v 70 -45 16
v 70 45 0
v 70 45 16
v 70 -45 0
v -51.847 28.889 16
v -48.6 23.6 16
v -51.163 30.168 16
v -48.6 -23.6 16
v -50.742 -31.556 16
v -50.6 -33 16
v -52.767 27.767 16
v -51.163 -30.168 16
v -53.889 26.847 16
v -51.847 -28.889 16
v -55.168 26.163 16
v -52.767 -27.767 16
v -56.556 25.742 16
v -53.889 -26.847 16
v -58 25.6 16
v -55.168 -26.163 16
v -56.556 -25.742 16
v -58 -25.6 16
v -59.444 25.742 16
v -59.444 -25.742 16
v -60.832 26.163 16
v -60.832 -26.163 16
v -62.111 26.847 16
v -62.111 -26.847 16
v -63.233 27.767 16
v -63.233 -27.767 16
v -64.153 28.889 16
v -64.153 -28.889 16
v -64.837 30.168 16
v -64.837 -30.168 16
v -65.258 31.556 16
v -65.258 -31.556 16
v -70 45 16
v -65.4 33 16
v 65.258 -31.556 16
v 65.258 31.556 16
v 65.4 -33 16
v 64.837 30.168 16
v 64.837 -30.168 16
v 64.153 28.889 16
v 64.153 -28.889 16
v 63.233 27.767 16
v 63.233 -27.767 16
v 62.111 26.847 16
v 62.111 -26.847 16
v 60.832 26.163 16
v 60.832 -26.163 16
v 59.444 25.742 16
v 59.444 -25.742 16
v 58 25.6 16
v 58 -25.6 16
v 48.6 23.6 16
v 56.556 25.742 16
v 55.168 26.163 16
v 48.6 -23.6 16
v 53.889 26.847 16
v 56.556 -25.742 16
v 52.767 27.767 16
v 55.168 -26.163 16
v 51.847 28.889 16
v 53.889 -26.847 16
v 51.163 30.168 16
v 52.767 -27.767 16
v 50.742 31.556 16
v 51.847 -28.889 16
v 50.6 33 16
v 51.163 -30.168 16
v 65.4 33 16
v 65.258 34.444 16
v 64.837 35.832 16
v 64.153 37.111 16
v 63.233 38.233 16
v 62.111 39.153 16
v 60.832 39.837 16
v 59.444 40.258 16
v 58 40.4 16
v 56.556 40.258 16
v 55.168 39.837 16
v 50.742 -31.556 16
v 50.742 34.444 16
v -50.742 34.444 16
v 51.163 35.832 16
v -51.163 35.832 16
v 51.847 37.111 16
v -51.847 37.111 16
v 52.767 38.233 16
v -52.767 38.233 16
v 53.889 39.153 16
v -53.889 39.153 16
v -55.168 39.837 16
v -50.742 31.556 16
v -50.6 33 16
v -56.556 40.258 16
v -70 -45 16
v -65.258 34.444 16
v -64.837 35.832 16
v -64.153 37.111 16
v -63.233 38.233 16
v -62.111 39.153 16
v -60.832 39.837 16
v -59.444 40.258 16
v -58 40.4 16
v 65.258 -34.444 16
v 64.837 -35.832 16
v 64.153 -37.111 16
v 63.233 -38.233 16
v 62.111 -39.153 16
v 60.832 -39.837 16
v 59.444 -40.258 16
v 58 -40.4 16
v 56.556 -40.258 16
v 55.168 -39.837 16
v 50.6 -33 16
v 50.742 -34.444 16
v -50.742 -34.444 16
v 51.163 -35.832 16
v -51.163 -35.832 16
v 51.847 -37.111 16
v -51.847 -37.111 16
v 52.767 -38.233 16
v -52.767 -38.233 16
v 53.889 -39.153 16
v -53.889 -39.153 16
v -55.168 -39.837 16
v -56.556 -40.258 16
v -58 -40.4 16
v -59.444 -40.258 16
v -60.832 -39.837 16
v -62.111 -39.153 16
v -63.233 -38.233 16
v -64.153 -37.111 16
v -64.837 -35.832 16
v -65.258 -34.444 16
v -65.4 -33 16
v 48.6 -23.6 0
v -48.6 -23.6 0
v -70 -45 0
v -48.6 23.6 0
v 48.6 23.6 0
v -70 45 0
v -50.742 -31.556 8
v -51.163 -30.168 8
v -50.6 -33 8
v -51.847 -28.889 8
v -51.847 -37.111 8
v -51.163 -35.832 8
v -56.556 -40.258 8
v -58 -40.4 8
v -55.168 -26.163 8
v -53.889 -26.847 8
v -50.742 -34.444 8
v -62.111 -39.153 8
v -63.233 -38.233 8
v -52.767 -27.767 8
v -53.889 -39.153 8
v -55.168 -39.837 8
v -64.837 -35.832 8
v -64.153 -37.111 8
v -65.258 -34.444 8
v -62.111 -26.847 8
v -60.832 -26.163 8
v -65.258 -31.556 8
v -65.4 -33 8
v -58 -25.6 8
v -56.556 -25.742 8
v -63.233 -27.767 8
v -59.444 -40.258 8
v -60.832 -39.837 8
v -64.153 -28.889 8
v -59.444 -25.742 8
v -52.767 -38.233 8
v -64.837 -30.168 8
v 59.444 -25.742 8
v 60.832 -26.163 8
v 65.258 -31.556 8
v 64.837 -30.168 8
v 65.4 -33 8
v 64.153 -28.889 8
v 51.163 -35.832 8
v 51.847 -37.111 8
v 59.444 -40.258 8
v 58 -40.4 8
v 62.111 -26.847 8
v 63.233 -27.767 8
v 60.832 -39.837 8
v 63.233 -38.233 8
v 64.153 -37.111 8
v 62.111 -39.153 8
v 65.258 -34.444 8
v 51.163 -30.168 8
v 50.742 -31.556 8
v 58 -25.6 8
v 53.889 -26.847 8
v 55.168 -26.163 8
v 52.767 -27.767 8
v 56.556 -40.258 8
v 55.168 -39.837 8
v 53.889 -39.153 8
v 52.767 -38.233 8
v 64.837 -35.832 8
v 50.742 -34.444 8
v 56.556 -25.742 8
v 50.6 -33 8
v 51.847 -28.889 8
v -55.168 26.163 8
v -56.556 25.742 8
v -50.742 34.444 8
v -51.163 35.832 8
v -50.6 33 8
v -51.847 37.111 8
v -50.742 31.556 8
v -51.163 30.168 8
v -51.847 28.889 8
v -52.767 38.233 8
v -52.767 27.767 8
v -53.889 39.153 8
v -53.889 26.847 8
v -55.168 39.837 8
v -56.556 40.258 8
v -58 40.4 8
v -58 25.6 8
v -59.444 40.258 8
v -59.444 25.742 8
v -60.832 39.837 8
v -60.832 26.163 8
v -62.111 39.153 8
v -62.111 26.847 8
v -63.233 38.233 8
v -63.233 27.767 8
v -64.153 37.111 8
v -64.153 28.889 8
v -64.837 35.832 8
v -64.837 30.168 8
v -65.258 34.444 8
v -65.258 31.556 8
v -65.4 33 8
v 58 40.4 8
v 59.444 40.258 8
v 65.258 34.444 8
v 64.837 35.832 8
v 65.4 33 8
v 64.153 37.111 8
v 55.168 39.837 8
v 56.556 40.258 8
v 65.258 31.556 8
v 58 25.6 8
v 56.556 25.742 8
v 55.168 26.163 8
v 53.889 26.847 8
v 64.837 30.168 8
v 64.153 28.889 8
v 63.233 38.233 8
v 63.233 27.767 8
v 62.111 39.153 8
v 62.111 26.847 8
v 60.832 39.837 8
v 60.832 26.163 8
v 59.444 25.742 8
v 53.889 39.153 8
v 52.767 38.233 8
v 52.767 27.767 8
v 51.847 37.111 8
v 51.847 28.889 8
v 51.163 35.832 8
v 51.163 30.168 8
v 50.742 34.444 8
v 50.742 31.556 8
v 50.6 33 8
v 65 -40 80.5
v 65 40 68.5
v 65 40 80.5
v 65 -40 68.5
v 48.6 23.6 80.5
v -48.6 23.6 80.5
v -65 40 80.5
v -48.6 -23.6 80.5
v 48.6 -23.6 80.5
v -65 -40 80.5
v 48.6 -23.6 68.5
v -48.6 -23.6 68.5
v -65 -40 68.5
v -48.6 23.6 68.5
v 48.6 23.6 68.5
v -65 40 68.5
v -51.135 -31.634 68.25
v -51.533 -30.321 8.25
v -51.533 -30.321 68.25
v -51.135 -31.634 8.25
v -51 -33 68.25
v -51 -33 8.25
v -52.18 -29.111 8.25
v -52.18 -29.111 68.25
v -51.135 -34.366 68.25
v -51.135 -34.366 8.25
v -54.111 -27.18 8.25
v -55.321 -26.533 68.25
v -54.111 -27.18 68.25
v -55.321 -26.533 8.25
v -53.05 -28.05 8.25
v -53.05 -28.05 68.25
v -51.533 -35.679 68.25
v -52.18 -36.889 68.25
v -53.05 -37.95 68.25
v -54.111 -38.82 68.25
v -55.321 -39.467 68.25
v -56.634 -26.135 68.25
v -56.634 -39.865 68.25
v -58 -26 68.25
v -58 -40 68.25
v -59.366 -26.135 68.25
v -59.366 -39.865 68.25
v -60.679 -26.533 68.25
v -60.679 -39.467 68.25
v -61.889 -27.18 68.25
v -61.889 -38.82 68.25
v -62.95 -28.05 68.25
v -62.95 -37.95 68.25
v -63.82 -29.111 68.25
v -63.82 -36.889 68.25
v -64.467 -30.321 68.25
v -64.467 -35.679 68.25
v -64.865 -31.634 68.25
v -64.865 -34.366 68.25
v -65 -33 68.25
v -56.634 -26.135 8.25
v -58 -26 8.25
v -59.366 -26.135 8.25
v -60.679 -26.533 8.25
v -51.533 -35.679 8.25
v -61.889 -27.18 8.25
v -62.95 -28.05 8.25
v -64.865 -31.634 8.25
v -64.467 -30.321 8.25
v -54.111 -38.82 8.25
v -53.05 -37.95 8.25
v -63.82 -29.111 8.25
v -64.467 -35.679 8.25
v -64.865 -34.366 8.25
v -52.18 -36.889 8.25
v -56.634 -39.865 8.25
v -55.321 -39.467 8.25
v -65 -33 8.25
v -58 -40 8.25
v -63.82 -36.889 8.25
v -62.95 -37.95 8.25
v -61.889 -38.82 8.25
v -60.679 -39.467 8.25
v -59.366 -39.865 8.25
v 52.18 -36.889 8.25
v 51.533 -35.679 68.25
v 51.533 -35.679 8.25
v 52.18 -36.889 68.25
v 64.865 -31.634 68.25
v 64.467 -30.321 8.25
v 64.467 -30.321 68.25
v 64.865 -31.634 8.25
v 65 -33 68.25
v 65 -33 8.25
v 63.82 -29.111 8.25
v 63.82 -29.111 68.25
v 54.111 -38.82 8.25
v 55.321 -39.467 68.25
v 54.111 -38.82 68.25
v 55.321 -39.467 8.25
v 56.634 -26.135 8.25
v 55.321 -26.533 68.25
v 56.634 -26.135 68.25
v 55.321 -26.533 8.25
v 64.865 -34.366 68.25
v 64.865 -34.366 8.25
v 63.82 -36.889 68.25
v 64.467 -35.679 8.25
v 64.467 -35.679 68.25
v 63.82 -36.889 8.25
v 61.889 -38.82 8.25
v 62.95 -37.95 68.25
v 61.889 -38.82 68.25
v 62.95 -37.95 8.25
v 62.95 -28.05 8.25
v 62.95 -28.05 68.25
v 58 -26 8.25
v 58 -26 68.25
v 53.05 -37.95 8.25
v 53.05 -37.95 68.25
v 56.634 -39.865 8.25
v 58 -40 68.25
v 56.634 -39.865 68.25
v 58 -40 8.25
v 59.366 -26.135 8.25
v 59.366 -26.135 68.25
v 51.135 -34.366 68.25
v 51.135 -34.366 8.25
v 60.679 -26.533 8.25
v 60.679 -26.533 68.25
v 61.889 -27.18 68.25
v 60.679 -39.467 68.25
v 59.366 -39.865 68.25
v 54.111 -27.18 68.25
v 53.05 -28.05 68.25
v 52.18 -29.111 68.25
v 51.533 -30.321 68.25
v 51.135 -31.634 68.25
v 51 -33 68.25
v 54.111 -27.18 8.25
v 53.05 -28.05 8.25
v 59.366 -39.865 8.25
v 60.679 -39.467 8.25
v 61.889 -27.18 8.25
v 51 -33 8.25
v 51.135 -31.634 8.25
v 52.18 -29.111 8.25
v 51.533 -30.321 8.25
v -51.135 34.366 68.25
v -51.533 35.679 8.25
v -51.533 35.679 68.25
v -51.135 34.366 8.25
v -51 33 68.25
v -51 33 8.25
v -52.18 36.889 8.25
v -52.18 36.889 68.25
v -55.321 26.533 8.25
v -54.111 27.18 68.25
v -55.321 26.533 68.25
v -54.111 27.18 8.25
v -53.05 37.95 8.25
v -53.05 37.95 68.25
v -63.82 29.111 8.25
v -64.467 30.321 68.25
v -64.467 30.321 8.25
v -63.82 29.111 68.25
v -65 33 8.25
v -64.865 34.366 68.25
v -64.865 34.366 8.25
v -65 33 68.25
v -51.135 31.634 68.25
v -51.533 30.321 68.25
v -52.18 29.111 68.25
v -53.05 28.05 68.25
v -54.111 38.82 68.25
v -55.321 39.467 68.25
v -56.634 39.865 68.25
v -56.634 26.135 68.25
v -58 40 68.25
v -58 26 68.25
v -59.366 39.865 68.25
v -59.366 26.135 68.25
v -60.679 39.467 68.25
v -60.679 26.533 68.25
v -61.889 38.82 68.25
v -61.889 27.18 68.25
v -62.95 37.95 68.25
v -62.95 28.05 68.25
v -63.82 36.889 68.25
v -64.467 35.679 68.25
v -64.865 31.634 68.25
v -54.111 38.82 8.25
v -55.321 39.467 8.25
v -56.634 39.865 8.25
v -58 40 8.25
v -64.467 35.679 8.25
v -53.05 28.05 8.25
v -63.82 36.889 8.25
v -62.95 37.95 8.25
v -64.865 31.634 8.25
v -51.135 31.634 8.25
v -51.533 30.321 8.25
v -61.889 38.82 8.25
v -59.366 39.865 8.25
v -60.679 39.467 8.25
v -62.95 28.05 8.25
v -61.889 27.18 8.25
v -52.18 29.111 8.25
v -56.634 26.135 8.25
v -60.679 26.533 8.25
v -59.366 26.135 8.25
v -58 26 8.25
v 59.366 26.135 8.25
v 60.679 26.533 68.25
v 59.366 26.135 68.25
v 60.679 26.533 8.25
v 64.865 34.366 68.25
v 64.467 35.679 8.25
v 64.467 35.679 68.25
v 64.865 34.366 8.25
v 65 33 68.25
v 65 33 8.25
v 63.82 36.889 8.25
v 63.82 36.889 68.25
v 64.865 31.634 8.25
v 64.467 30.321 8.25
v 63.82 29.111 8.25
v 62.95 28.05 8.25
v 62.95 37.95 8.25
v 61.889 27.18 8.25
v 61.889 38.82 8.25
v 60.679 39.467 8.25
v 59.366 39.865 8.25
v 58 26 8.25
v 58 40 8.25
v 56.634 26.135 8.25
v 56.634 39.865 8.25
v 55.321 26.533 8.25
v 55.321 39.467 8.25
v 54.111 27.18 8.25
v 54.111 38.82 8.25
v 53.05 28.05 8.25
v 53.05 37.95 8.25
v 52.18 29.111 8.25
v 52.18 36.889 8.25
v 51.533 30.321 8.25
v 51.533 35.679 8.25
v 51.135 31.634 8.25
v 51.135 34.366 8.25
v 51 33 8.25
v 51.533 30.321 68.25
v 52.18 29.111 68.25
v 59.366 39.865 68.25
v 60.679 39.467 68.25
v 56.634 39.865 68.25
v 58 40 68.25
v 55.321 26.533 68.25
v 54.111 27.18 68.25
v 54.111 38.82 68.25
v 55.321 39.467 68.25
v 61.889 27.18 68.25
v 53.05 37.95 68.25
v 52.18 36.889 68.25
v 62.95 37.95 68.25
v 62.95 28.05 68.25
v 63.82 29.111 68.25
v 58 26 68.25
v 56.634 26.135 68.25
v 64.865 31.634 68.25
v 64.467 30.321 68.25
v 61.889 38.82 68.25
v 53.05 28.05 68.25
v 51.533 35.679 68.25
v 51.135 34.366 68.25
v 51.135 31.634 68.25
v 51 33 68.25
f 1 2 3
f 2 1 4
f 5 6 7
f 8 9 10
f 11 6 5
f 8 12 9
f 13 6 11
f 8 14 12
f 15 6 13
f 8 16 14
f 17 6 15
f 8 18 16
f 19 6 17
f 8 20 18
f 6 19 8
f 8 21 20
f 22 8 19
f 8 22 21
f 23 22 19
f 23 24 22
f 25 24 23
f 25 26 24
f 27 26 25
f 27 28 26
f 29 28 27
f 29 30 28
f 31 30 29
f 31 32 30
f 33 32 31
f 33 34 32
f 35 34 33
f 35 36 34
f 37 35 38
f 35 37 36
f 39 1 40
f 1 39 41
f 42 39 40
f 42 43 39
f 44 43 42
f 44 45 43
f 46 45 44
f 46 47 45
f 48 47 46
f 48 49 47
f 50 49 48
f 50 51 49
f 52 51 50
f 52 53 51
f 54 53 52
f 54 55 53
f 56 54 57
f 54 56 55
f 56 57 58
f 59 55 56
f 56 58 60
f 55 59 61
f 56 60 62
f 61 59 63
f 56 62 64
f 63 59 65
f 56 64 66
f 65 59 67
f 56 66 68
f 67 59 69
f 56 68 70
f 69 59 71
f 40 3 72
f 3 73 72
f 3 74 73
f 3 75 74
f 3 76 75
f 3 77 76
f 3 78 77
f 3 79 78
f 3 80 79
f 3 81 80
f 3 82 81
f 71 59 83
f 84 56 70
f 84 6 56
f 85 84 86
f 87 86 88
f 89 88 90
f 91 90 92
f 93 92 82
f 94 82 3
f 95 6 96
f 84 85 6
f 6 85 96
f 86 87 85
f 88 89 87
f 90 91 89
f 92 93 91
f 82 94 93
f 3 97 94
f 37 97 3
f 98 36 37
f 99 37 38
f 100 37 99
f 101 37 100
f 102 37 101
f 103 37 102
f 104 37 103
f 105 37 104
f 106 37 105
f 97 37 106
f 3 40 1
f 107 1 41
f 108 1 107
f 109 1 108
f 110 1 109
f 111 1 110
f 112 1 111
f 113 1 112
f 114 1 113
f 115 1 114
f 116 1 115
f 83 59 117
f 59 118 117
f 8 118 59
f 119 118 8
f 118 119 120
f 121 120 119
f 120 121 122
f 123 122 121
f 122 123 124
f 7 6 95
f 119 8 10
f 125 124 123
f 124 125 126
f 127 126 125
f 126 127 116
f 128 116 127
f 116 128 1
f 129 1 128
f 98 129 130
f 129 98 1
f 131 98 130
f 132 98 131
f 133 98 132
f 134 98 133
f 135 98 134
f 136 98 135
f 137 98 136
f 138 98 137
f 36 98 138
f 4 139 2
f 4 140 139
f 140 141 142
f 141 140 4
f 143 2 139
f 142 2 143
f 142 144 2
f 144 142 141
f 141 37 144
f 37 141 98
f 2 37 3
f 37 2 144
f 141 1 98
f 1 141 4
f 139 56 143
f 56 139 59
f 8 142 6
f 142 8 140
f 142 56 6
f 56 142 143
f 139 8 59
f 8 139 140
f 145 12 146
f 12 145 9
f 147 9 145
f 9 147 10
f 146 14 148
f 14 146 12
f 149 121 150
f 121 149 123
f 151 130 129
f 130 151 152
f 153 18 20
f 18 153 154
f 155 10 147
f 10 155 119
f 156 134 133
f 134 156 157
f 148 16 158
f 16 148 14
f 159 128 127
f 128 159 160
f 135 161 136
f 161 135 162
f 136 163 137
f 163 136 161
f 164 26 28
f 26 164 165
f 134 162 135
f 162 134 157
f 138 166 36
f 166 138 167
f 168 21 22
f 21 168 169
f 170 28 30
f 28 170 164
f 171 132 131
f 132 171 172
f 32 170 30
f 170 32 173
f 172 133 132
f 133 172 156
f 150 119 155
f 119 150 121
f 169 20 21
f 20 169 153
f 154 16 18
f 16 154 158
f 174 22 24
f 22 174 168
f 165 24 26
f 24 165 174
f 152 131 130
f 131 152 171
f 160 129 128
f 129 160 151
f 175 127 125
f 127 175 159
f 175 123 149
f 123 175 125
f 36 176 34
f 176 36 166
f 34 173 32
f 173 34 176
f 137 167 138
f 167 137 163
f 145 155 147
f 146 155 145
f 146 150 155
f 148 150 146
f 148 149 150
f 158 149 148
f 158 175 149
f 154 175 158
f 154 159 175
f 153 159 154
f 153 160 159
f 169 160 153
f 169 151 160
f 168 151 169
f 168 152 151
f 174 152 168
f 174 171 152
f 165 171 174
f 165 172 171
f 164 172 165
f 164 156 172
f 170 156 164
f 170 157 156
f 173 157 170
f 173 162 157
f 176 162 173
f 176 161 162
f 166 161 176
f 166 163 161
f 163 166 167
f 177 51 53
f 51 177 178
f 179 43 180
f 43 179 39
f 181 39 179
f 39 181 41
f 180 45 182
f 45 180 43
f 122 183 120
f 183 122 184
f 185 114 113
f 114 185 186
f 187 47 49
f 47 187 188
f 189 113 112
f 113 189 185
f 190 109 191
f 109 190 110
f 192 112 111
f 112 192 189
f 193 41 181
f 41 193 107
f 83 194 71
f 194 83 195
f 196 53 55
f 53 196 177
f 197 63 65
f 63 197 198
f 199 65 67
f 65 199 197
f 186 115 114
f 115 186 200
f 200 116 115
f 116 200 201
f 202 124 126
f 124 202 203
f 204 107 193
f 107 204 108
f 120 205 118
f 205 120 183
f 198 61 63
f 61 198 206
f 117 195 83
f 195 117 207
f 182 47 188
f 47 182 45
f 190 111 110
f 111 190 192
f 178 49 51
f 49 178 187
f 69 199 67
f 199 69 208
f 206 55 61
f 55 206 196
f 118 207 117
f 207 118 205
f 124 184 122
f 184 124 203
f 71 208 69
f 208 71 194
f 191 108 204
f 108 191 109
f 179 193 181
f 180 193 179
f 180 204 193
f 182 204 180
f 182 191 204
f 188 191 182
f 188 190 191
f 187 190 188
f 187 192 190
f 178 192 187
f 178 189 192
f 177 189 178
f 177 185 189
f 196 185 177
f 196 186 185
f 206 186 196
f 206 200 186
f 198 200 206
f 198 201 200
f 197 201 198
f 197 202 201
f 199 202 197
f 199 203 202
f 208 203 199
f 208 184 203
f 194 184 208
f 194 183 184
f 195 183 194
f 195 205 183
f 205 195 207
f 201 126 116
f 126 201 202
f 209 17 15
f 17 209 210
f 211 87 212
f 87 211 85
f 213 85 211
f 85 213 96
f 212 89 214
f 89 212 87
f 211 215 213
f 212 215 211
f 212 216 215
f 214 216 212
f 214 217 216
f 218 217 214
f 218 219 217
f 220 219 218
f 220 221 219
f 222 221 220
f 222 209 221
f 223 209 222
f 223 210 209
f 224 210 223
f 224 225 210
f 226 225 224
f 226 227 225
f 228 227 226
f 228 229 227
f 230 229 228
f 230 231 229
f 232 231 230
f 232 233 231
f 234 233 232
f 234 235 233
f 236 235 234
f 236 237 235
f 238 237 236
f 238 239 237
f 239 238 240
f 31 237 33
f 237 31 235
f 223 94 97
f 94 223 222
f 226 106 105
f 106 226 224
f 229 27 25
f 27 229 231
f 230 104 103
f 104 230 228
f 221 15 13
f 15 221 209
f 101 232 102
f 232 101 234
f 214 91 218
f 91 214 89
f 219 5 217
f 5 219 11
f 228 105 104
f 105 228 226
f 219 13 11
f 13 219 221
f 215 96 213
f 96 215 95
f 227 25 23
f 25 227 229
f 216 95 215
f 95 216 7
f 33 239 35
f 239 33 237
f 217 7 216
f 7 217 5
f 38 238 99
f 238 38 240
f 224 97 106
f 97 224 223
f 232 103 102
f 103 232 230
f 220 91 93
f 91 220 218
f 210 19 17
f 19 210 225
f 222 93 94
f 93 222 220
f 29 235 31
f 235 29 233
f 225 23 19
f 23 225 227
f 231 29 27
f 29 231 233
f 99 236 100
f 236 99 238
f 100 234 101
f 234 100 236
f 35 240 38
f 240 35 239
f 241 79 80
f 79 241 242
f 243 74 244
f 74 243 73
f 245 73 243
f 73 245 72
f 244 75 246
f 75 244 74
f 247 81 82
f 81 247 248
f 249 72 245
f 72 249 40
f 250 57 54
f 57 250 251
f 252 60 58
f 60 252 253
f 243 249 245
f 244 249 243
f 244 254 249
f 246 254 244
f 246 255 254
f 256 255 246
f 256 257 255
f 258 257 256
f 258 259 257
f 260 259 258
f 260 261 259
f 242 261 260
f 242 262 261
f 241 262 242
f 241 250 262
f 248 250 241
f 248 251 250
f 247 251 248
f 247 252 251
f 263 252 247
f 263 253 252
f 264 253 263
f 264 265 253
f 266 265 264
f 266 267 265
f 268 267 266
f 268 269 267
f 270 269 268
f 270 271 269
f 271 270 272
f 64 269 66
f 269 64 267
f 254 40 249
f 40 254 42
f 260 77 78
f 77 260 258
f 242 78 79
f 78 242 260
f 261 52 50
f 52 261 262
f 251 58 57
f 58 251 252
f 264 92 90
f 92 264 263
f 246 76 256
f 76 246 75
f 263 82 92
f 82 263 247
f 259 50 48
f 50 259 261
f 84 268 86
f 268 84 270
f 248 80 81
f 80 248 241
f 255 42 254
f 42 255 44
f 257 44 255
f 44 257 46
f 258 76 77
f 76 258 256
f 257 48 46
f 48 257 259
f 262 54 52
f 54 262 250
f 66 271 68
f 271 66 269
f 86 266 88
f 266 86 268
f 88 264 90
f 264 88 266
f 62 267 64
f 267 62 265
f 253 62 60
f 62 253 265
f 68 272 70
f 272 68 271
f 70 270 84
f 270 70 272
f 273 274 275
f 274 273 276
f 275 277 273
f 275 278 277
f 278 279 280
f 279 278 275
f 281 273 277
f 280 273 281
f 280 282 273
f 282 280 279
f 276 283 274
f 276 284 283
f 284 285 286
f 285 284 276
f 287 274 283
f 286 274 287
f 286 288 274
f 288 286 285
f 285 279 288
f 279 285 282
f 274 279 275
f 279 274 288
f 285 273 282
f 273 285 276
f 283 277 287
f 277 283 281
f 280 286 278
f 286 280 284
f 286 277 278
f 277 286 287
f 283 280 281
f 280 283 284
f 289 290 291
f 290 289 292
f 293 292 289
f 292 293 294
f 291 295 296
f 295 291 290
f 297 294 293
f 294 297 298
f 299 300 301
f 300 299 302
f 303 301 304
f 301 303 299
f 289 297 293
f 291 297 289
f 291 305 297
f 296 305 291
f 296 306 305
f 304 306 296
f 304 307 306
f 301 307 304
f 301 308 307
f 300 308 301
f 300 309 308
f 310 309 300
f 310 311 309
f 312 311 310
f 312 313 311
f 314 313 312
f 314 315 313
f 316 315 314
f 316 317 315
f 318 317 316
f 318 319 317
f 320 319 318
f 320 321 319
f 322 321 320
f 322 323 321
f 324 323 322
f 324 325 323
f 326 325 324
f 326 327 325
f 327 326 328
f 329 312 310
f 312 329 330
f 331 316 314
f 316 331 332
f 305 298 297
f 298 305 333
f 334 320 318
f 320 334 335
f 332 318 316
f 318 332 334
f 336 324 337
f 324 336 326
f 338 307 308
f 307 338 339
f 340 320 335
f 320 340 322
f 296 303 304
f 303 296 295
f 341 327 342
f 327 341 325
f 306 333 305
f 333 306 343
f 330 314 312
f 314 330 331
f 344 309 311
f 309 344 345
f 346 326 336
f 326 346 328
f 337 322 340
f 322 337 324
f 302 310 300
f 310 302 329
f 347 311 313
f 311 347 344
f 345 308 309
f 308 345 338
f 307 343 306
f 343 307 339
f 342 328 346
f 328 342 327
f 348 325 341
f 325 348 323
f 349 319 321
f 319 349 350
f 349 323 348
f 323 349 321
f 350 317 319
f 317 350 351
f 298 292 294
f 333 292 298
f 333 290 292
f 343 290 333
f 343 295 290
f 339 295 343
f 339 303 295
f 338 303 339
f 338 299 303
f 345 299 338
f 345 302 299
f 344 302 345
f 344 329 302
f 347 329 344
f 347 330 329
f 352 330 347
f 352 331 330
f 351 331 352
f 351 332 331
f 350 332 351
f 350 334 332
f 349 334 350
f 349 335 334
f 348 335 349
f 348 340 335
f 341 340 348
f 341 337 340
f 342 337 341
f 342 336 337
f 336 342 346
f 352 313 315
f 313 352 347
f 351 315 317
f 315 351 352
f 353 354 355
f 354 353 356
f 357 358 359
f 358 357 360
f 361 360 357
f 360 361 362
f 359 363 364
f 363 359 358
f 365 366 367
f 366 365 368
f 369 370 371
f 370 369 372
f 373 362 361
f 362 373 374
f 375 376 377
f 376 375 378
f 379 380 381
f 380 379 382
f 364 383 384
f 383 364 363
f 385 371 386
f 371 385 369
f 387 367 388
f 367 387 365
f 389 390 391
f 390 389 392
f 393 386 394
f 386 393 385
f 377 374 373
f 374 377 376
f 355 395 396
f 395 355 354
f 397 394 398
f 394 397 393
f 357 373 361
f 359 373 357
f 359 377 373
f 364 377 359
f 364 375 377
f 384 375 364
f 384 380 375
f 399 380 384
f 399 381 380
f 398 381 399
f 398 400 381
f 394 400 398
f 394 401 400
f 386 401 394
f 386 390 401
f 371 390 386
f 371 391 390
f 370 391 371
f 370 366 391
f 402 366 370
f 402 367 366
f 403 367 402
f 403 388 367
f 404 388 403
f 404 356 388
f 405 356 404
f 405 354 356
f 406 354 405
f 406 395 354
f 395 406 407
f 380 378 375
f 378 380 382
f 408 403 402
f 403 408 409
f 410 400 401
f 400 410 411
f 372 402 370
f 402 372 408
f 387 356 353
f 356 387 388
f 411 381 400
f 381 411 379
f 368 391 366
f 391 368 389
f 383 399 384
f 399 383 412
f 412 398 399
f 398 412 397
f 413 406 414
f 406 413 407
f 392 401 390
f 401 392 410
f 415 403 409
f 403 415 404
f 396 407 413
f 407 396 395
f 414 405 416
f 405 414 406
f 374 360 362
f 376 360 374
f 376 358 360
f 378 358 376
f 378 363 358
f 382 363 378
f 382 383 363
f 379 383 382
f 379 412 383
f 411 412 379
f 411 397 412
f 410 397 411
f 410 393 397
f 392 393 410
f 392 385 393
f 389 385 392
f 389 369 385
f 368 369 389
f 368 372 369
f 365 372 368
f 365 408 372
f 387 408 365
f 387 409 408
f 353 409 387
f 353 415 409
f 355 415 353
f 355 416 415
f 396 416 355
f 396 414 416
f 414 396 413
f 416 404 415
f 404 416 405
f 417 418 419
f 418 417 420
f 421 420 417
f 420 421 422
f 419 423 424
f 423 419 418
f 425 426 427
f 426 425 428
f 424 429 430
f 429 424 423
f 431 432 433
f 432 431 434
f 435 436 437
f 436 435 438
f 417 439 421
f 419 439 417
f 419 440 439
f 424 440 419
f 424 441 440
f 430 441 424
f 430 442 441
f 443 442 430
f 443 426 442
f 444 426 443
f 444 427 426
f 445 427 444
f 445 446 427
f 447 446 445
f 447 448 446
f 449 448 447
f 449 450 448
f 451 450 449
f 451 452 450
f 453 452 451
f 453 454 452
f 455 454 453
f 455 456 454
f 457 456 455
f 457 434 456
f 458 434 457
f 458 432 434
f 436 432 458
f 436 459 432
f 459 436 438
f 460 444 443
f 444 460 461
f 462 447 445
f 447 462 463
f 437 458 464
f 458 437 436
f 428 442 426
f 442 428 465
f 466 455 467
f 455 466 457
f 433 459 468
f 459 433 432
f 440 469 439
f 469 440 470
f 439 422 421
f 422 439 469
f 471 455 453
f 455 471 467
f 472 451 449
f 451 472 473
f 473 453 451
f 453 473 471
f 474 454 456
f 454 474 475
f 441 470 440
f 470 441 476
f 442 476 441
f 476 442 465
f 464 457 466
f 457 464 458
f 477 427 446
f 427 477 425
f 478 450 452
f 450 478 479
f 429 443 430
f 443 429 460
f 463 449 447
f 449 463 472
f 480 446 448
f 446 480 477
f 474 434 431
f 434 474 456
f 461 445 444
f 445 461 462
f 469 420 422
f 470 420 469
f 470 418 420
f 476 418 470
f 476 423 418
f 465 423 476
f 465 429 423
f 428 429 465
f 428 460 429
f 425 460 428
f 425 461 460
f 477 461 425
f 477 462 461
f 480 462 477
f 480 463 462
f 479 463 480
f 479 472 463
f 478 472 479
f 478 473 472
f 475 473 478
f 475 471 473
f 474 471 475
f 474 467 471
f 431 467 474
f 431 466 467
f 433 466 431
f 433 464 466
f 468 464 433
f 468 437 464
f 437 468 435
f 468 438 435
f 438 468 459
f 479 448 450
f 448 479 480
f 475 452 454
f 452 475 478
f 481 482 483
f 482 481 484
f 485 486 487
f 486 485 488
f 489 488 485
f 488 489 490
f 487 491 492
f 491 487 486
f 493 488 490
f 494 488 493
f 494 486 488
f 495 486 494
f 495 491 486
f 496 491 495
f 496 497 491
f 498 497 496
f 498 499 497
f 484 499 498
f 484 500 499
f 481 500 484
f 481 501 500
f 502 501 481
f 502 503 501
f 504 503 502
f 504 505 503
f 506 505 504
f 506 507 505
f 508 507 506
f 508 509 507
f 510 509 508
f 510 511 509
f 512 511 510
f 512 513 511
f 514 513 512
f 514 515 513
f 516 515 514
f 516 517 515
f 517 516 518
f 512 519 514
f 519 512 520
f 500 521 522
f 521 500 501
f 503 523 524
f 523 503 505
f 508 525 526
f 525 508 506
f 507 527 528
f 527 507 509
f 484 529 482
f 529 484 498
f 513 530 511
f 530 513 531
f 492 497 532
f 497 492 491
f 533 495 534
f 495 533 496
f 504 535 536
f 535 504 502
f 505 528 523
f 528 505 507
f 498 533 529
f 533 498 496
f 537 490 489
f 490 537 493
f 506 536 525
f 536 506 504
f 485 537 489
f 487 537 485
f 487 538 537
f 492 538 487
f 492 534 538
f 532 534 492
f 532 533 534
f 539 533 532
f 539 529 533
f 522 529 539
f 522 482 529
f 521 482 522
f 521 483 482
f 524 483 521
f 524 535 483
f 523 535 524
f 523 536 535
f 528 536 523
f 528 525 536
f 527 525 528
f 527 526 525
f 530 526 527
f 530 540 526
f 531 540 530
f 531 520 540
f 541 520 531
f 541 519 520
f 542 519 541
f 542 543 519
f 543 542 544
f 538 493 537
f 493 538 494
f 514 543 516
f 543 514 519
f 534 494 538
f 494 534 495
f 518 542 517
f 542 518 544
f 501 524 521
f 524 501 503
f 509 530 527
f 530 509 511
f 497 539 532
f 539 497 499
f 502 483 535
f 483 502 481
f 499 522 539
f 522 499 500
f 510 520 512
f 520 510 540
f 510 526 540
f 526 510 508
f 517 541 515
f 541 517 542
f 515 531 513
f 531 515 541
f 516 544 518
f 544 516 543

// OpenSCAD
$fn = 32;

// ------------------------------------------------------------------------
// Frame cube: base 140 x 90 mm, posts 60 mm tall
// Every part is its own module, assembly() places every instance.
// ------------------------------------------------------------------------

// --- part 1 ---
module base_frame() {
  difference() {
    translate([-70, -45, 0]) cube([140, 90, 16]);
    translate([-48.6, -23.6, -1]) cube([97.2, 47.2, 18]);
    translate([-58, -33, 8]) cylinder(h = 9, d = 14.8);
    translate([58, -33, 8]) cylinder(h = 9, d = 14.8);
    translate([-58, 33, 8]) cylinder(h = 9, d = 14.8);
    translate([58, 33, 8]) cylinder(h = 9, d = 14.8);
  }
}

// --- part 2 ---
module corner_post() {
  cylinder(h = 60, d = 14);
}

// --- part 3 ---
module top_frame() {
  difference() {
    translate([-65, -40, 0]) cube([130, 80, 12]);
    translate([-48.6, -23.6, -1]) cube([97.2, 47.2, 14]);
  }
}

// --- assembly ---
module assembly() {
  color([0.80, 0.24, 0.20]) translate([0, 0, 0]) rotate([0, 0, 0]) base_frame();
  color([0.20, 0.45, 0.75]) translate([-58, -33, 8.25]) rotate([0, 0, 0]) corner_post();
  color([0.25, 0.62, 0.32]) translate([58, -33, 8.25]) rotate([0, 0, 0]) corner_post();
  color([0.92, 0.70, 0.18]) translate([-58, 33, 8.25]) rotate([0, 0, 0]) corner_post();
  color([0.58, 0.35, 0.70]) translate([58, 33, 8.25]) rotate([0, 0, 0]) corner_post();
  color([0.16, 0.66, 0.66]) translate([0, 0, 68.5]) rotate([0, 0, 0]) top_frame();
}

assembly();
